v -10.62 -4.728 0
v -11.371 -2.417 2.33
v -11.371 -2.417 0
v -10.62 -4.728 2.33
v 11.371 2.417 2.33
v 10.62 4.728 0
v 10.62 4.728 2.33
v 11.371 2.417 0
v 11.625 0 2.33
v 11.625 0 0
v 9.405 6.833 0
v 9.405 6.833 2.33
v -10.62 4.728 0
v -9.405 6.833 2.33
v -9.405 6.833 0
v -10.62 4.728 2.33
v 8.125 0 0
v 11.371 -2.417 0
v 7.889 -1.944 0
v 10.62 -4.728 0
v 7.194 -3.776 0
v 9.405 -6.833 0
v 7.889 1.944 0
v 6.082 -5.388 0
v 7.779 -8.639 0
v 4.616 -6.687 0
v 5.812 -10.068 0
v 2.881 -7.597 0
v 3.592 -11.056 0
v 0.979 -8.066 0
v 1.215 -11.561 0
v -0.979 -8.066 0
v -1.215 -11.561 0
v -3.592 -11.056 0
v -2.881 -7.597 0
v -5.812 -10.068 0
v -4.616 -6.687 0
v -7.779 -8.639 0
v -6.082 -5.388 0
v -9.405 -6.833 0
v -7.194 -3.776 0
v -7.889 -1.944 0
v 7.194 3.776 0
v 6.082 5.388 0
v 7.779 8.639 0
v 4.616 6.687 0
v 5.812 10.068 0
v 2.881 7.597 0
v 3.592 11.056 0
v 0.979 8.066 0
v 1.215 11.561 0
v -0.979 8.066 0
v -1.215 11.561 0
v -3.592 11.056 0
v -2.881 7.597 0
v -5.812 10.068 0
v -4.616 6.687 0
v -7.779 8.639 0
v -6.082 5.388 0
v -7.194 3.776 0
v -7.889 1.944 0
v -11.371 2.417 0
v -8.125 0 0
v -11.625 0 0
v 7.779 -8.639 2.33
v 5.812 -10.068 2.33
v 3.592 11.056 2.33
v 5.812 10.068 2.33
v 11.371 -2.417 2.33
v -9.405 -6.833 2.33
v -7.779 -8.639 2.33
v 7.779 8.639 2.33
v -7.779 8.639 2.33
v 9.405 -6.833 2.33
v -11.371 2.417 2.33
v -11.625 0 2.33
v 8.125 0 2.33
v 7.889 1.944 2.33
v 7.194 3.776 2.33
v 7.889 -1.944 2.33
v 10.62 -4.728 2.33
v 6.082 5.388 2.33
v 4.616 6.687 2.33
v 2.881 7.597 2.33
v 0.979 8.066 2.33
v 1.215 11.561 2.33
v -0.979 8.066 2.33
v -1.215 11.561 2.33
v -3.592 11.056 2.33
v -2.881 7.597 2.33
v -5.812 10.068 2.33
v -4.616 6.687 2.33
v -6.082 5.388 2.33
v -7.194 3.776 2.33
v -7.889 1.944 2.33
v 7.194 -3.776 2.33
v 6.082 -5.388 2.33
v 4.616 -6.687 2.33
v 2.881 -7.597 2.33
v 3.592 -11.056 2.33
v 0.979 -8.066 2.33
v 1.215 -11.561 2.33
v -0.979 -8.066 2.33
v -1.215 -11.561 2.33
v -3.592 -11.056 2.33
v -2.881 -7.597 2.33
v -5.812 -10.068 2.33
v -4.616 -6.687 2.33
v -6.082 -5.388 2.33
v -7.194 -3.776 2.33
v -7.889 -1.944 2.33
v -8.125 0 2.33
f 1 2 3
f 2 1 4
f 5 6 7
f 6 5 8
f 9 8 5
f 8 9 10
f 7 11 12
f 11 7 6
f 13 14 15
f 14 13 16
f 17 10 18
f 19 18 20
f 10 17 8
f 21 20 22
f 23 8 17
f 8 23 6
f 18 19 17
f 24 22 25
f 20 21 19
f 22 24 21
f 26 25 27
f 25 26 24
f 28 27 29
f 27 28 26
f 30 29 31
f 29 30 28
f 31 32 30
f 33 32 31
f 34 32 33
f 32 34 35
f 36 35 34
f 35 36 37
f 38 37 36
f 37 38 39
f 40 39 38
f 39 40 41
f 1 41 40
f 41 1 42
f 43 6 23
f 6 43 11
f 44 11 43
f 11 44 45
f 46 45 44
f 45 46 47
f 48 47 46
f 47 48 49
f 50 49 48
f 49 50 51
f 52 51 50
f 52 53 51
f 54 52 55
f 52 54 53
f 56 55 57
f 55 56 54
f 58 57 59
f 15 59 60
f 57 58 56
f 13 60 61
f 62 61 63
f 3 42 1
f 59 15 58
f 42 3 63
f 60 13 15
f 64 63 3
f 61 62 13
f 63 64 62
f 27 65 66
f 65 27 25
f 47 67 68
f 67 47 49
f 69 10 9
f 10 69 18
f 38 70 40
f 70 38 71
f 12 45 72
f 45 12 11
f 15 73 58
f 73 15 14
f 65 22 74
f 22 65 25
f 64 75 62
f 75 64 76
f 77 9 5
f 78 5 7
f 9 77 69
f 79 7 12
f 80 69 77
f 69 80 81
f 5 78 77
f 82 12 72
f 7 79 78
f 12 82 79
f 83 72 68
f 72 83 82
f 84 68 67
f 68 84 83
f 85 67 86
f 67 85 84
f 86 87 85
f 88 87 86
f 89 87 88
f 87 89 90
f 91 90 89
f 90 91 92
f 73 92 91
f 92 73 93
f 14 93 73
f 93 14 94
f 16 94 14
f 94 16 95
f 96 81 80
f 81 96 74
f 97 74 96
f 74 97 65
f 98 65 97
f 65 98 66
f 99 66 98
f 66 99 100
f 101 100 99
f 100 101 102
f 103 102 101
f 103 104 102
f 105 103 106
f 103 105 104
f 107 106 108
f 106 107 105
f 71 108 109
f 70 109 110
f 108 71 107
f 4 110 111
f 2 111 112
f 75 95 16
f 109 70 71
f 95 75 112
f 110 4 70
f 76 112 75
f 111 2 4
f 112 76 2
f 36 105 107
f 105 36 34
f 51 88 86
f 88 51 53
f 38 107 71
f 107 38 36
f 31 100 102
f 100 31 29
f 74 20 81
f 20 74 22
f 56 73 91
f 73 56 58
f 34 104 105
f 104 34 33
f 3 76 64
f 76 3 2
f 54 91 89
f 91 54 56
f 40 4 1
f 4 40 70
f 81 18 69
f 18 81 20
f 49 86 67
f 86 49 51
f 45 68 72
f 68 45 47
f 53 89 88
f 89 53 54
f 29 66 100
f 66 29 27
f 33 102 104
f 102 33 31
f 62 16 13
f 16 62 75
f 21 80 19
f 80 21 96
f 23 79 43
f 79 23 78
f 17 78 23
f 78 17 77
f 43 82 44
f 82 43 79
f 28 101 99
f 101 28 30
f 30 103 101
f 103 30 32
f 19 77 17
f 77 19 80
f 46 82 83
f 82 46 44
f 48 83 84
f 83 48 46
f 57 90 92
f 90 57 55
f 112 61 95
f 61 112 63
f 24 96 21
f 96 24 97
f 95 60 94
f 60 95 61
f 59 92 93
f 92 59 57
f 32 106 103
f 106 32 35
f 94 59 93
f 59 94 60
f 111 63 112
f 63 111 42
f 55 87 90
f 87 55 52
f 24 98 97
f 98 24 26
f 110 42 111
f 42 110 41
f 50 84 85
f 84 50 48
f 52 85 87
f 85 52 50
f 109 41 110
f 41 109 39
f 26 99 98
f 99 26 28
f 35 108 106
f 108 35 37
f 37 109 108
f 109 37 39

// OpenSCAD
//23.25 mm, thickness 2.33

module coin(r=23.25/2, h=2.33, rim=3.5, halves=0, wholes=1){
  difference(){
    cylinder(r=r, h=h);
    cylinder(r=(r-rim), h=h);
  }
}

// 1 Euro
coin();
//translate([0,30,0]) coin();
// 2 Euro
//translate([0,30,0]) coin(r=25.75/2, h=2.2);
// 50 Cent
//translate([30,0,0]) coin(r=24.25/2, h=2.38);
